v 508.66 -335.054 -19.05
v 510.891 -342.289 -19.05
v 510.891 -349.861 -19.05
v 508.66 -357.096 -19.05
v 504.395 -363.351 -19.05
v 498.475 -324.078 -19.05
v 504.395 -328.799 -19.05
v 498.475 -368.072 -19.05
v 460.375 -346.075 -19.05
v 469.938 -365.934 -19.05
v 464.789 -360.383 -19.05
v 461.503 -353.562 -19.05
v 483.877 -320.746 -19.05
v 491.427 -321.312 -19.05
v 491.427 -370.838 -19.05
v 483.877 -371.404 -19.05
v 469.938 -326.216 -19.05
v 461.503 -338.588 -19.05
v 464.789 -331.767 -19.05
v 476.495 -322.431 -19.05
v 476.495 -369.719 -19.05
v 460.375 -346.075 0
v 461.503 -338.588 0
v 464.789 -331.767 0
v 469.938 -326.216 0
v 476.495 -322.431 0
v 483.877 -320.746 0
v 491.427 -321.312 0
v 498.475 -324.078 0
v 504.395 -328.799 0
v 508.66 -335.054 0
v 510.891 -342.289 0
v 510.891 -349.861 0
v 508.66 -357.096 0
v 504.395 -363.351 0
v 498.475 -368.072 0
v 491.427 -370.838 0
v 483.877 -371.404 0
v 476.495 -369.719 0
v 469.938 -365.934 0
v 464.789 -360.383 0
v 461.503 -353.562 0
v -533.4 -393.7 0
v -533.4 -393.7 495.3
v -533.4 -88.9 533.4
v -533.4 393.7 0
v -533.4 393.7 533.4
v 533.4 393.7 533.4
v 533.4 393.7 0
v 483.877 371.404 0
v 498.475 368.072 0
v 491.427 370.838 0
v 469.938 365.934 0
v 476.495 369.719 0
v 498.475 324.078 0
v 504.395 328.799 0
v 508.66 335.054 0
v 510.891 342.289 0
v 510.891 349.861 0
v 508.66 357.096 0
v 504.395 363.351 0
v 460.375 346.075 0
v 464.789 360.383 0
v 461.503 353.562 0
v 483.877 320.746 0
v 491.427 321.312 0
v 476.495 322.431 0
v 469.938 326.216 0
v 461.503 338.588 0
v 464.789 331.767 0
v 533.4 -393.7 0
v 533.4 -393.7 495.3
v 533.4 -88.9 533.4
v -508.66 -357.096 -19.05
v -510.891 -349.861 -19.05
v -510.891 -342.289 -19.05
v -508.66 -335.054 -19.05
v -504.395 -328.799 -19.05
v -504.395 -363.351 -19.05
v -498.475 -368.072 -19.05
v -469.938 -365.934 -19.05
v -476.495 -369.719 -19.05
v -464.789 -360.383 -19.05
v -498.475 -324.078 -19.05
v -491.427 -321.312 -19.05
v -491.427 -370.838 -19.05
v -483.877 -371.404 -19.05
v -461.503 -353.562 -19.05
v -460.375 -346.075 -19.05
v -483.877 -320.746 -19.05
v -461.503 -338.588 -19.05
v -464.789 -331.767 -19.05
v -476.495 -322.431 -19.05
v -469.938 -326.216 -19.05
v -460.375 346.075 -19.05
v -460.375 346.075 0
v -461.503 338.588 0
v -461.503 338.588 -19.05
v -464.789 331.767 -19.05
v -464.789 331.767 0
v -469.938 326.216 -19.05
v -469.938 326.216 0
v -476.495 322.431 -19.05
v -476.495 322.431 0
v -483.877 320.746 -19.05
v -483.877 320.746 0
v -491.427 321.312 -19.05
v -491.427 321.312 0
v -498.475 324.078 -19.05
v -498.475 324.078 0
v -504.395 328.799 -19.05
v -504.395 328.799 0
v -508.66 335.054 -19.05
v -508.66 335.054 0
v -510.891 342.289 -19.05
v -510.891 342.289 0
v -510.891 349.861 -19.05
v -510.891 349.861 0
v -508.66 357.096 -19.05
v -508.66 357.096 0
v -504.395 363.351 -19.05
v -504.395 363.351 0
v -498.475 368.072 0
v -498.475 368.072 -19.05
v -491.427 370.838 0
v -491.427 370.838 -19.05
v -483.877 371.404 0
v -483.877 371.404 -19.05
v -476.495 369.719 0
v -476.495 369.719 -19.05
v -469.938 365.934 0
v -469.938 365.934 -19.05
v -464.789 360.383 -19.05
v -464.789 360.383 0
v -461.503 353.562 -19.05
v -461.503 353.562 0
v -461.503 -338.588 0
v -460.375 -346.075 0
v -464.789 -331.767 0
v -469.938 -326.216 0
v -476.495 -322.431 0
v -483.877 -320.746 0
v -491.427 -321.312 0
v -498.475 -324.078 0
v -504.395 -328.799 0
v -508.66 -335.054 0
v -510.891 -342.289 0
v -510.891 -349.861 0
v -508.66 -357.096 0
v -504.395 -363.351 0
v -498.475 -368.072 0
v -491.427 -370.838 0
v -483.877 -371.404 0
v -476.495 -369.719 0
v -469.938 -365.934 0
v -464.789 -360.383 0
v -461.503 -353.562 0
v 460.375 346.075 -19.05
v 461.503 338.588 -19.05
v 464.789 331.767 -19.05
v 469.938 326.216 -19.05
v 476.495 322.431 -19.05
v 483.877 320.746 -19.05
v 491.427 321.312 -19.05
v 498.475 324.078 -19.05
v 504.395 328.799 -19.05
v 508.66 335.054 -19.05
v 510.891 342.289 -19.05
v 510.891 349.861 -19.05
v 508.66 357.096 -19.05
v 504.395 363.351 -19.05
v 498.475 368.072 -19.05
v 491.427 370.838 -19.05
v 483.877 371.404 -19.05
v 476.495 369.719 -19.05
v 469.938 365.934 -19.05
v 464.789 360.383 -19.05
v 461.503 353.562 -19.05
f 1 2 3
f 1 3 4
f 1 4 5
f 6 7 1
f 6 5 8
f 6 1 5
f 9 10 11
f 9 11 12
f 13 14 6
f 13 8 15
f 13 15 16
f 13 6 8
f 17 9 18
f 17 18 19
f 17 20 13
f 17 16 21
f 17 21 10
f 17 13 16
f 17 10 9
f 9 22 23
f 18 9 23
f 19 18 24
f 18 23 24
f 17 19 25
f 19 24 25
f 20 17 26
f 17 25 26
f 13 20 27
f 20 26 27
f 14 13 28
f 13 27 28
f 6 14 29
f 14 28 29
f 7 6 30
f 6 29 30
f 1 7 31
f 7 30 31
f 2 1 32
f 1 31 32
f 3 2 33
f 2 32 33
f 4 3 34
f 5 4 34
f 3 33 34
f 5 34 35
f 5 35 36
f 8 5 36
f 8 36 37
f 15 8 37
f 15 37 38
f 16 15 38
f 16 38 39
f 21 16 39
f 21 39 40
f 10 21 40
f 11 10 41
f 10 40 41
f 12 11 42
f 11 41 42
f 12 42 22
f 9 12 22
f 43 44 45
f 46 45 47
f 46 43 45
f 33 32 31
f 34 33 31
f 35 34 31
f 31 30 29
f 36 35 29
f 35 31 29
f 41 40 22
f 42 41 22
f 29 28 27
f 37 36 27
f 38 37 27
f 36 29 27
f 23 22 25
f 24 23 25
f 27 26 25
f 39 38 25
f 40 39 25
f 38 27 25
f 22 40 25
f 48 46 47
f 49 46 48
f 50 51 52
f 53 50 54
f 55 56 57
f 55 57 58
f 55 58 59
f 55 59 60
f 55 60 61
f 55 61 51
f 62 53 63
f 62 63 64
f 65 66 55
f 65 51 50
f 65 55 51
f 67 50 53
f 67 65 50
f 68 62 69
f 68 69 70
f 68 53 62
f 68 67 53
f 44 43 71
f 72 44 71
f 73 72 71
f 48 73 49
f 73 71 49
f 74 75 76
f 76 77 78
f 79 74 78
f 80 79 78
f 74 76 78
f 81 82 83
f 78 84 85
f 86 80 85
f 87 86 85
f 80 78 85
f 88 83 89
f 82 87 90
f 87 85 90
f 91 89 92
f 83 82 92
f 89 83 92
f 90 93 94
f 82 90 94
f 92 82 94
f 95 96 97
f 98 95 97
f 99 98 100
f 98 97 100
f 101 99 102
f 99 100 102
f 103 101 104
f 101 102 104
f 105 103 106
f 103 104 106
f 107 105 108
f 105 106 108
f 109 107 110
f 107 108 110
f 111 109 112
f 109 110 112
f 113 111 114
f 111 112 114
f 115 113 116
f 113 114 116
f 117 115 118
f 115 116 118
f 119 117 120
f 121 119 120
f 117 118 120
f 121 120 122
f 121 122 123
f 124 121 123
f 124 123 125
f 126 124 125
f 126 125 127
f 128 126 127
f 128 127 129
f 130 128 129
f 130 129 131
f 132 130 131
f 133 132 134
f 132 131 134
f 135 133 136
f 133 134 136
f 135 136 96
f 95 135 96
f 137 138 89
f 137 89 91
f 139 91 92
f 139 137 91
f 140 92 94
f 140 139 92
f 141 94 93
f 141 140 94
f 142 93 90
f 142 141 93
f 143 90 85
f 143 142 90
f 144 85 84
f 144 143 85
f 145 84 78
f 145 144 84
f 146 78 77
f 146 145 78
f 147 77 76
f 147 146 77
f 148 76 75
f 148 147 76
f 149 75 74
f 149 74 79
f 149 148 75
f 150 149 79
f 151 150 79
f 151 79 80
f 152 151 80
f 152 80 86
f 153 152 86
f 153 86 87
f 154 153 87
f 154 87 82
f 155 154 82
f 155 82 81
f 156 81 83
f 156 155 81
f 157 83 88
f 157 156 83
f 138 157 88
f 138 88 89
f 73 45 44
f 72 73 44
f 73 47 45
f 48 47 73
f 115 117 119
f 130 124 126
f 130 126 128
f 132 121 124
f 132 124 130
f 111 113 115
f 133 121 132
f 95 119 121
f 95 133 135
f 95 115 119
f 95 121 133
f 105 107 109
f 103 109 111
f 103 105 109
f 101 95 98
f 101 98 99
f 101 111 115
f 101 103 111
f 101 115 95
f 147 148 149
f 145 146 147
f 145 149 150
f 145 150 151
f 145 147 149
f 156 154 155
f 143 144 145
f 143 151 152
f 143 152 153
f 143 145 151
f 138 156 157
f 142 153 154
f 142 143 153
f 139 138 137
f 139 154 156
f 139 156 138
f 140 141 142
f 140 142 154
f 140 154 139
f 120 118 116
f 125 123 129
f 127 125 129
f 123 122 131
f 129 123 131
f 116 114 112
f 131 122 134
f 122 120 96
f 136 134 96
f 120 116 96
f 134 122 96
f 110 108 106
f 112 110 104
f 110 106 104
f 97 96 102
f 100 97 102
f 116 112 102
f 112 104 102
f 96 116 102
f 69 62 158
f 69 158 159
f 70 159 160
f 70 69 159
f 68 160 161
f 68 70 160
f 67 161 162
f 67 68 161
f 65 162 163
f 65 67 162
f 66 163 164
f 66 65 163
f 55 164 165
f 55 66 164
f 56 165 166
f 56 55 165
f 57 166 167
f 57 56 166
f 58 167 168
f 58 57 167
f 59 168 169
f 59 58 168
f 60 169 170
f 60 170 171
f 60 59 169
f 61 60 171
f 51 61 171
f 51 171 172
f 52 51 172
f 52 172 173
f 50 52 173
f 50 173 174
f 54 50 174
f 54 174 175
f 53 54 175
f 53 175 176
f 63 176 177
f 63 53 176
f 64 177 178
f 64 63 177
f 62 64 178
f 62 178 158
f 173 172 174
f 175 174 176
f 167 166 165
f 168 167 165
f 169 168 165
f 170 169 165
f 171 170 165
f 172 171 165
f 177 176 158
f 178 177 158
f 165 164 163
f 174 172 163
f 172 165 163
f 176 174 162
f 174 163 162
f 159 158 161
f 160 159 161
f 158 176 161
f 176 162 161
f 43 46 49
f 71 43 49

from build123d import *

# Parameters (mm, degrees)
F0_W     = 1066.8
F0_H     = 787.4
F1_DEPTH = 533.4
F2_R     = 25.4
F3_DEPTH = 19.05
F7_DEPTH = 1066.801


with BuildPart() as f1:
    # F0 (on Top) → F1 (new body)
    with BuildSketch(Plane.XY):
        Rectangle(F0_W, F0_H)
    extrude(amount=F1_DEPTH)

    # F6 (on face) → F7 (cut, through all)
    with BuildSketch(Plane(origin=(-533.4, 0, 0), x_dir=(0, -1, 0), z_dir=(-1, 0, 0))):
        Polygon((393.7, 533.4), (88.9, 533.4), (393.7, 495.3), align=None)
    extrude(amount=-F7_DEPTH, mode=Mode.SUBTRACT)


with BuildPart() as f3:
    # F2 (on face) → F3 (new body)
    with BuildSketch(Plane(origin=(0, 0, 0), x_dir=(1, 0, 0), z_dir=(0, 0, -1))):
        with Locations((-485.775, -346.075)):
            Circle(F2_R)
    extrude(amount=F3_DEPTH)


with BuildPart() as f4_1:
    # F4: instance of F3
    add(f3.part.mirror(Plane.XZ))


with BuildPart() as f5_1:
    # F5: instance of F3
    add(f3.part.mirror(Plane.YZ))


with BuildPart() as f5_2:
    # F5: instance of F4_1
    add(f4_1.part.mirror(Plane.YZ))


solid = Compound([f1.part, f3.part, f4_1.part, f5_1.part, f5_2.part])
